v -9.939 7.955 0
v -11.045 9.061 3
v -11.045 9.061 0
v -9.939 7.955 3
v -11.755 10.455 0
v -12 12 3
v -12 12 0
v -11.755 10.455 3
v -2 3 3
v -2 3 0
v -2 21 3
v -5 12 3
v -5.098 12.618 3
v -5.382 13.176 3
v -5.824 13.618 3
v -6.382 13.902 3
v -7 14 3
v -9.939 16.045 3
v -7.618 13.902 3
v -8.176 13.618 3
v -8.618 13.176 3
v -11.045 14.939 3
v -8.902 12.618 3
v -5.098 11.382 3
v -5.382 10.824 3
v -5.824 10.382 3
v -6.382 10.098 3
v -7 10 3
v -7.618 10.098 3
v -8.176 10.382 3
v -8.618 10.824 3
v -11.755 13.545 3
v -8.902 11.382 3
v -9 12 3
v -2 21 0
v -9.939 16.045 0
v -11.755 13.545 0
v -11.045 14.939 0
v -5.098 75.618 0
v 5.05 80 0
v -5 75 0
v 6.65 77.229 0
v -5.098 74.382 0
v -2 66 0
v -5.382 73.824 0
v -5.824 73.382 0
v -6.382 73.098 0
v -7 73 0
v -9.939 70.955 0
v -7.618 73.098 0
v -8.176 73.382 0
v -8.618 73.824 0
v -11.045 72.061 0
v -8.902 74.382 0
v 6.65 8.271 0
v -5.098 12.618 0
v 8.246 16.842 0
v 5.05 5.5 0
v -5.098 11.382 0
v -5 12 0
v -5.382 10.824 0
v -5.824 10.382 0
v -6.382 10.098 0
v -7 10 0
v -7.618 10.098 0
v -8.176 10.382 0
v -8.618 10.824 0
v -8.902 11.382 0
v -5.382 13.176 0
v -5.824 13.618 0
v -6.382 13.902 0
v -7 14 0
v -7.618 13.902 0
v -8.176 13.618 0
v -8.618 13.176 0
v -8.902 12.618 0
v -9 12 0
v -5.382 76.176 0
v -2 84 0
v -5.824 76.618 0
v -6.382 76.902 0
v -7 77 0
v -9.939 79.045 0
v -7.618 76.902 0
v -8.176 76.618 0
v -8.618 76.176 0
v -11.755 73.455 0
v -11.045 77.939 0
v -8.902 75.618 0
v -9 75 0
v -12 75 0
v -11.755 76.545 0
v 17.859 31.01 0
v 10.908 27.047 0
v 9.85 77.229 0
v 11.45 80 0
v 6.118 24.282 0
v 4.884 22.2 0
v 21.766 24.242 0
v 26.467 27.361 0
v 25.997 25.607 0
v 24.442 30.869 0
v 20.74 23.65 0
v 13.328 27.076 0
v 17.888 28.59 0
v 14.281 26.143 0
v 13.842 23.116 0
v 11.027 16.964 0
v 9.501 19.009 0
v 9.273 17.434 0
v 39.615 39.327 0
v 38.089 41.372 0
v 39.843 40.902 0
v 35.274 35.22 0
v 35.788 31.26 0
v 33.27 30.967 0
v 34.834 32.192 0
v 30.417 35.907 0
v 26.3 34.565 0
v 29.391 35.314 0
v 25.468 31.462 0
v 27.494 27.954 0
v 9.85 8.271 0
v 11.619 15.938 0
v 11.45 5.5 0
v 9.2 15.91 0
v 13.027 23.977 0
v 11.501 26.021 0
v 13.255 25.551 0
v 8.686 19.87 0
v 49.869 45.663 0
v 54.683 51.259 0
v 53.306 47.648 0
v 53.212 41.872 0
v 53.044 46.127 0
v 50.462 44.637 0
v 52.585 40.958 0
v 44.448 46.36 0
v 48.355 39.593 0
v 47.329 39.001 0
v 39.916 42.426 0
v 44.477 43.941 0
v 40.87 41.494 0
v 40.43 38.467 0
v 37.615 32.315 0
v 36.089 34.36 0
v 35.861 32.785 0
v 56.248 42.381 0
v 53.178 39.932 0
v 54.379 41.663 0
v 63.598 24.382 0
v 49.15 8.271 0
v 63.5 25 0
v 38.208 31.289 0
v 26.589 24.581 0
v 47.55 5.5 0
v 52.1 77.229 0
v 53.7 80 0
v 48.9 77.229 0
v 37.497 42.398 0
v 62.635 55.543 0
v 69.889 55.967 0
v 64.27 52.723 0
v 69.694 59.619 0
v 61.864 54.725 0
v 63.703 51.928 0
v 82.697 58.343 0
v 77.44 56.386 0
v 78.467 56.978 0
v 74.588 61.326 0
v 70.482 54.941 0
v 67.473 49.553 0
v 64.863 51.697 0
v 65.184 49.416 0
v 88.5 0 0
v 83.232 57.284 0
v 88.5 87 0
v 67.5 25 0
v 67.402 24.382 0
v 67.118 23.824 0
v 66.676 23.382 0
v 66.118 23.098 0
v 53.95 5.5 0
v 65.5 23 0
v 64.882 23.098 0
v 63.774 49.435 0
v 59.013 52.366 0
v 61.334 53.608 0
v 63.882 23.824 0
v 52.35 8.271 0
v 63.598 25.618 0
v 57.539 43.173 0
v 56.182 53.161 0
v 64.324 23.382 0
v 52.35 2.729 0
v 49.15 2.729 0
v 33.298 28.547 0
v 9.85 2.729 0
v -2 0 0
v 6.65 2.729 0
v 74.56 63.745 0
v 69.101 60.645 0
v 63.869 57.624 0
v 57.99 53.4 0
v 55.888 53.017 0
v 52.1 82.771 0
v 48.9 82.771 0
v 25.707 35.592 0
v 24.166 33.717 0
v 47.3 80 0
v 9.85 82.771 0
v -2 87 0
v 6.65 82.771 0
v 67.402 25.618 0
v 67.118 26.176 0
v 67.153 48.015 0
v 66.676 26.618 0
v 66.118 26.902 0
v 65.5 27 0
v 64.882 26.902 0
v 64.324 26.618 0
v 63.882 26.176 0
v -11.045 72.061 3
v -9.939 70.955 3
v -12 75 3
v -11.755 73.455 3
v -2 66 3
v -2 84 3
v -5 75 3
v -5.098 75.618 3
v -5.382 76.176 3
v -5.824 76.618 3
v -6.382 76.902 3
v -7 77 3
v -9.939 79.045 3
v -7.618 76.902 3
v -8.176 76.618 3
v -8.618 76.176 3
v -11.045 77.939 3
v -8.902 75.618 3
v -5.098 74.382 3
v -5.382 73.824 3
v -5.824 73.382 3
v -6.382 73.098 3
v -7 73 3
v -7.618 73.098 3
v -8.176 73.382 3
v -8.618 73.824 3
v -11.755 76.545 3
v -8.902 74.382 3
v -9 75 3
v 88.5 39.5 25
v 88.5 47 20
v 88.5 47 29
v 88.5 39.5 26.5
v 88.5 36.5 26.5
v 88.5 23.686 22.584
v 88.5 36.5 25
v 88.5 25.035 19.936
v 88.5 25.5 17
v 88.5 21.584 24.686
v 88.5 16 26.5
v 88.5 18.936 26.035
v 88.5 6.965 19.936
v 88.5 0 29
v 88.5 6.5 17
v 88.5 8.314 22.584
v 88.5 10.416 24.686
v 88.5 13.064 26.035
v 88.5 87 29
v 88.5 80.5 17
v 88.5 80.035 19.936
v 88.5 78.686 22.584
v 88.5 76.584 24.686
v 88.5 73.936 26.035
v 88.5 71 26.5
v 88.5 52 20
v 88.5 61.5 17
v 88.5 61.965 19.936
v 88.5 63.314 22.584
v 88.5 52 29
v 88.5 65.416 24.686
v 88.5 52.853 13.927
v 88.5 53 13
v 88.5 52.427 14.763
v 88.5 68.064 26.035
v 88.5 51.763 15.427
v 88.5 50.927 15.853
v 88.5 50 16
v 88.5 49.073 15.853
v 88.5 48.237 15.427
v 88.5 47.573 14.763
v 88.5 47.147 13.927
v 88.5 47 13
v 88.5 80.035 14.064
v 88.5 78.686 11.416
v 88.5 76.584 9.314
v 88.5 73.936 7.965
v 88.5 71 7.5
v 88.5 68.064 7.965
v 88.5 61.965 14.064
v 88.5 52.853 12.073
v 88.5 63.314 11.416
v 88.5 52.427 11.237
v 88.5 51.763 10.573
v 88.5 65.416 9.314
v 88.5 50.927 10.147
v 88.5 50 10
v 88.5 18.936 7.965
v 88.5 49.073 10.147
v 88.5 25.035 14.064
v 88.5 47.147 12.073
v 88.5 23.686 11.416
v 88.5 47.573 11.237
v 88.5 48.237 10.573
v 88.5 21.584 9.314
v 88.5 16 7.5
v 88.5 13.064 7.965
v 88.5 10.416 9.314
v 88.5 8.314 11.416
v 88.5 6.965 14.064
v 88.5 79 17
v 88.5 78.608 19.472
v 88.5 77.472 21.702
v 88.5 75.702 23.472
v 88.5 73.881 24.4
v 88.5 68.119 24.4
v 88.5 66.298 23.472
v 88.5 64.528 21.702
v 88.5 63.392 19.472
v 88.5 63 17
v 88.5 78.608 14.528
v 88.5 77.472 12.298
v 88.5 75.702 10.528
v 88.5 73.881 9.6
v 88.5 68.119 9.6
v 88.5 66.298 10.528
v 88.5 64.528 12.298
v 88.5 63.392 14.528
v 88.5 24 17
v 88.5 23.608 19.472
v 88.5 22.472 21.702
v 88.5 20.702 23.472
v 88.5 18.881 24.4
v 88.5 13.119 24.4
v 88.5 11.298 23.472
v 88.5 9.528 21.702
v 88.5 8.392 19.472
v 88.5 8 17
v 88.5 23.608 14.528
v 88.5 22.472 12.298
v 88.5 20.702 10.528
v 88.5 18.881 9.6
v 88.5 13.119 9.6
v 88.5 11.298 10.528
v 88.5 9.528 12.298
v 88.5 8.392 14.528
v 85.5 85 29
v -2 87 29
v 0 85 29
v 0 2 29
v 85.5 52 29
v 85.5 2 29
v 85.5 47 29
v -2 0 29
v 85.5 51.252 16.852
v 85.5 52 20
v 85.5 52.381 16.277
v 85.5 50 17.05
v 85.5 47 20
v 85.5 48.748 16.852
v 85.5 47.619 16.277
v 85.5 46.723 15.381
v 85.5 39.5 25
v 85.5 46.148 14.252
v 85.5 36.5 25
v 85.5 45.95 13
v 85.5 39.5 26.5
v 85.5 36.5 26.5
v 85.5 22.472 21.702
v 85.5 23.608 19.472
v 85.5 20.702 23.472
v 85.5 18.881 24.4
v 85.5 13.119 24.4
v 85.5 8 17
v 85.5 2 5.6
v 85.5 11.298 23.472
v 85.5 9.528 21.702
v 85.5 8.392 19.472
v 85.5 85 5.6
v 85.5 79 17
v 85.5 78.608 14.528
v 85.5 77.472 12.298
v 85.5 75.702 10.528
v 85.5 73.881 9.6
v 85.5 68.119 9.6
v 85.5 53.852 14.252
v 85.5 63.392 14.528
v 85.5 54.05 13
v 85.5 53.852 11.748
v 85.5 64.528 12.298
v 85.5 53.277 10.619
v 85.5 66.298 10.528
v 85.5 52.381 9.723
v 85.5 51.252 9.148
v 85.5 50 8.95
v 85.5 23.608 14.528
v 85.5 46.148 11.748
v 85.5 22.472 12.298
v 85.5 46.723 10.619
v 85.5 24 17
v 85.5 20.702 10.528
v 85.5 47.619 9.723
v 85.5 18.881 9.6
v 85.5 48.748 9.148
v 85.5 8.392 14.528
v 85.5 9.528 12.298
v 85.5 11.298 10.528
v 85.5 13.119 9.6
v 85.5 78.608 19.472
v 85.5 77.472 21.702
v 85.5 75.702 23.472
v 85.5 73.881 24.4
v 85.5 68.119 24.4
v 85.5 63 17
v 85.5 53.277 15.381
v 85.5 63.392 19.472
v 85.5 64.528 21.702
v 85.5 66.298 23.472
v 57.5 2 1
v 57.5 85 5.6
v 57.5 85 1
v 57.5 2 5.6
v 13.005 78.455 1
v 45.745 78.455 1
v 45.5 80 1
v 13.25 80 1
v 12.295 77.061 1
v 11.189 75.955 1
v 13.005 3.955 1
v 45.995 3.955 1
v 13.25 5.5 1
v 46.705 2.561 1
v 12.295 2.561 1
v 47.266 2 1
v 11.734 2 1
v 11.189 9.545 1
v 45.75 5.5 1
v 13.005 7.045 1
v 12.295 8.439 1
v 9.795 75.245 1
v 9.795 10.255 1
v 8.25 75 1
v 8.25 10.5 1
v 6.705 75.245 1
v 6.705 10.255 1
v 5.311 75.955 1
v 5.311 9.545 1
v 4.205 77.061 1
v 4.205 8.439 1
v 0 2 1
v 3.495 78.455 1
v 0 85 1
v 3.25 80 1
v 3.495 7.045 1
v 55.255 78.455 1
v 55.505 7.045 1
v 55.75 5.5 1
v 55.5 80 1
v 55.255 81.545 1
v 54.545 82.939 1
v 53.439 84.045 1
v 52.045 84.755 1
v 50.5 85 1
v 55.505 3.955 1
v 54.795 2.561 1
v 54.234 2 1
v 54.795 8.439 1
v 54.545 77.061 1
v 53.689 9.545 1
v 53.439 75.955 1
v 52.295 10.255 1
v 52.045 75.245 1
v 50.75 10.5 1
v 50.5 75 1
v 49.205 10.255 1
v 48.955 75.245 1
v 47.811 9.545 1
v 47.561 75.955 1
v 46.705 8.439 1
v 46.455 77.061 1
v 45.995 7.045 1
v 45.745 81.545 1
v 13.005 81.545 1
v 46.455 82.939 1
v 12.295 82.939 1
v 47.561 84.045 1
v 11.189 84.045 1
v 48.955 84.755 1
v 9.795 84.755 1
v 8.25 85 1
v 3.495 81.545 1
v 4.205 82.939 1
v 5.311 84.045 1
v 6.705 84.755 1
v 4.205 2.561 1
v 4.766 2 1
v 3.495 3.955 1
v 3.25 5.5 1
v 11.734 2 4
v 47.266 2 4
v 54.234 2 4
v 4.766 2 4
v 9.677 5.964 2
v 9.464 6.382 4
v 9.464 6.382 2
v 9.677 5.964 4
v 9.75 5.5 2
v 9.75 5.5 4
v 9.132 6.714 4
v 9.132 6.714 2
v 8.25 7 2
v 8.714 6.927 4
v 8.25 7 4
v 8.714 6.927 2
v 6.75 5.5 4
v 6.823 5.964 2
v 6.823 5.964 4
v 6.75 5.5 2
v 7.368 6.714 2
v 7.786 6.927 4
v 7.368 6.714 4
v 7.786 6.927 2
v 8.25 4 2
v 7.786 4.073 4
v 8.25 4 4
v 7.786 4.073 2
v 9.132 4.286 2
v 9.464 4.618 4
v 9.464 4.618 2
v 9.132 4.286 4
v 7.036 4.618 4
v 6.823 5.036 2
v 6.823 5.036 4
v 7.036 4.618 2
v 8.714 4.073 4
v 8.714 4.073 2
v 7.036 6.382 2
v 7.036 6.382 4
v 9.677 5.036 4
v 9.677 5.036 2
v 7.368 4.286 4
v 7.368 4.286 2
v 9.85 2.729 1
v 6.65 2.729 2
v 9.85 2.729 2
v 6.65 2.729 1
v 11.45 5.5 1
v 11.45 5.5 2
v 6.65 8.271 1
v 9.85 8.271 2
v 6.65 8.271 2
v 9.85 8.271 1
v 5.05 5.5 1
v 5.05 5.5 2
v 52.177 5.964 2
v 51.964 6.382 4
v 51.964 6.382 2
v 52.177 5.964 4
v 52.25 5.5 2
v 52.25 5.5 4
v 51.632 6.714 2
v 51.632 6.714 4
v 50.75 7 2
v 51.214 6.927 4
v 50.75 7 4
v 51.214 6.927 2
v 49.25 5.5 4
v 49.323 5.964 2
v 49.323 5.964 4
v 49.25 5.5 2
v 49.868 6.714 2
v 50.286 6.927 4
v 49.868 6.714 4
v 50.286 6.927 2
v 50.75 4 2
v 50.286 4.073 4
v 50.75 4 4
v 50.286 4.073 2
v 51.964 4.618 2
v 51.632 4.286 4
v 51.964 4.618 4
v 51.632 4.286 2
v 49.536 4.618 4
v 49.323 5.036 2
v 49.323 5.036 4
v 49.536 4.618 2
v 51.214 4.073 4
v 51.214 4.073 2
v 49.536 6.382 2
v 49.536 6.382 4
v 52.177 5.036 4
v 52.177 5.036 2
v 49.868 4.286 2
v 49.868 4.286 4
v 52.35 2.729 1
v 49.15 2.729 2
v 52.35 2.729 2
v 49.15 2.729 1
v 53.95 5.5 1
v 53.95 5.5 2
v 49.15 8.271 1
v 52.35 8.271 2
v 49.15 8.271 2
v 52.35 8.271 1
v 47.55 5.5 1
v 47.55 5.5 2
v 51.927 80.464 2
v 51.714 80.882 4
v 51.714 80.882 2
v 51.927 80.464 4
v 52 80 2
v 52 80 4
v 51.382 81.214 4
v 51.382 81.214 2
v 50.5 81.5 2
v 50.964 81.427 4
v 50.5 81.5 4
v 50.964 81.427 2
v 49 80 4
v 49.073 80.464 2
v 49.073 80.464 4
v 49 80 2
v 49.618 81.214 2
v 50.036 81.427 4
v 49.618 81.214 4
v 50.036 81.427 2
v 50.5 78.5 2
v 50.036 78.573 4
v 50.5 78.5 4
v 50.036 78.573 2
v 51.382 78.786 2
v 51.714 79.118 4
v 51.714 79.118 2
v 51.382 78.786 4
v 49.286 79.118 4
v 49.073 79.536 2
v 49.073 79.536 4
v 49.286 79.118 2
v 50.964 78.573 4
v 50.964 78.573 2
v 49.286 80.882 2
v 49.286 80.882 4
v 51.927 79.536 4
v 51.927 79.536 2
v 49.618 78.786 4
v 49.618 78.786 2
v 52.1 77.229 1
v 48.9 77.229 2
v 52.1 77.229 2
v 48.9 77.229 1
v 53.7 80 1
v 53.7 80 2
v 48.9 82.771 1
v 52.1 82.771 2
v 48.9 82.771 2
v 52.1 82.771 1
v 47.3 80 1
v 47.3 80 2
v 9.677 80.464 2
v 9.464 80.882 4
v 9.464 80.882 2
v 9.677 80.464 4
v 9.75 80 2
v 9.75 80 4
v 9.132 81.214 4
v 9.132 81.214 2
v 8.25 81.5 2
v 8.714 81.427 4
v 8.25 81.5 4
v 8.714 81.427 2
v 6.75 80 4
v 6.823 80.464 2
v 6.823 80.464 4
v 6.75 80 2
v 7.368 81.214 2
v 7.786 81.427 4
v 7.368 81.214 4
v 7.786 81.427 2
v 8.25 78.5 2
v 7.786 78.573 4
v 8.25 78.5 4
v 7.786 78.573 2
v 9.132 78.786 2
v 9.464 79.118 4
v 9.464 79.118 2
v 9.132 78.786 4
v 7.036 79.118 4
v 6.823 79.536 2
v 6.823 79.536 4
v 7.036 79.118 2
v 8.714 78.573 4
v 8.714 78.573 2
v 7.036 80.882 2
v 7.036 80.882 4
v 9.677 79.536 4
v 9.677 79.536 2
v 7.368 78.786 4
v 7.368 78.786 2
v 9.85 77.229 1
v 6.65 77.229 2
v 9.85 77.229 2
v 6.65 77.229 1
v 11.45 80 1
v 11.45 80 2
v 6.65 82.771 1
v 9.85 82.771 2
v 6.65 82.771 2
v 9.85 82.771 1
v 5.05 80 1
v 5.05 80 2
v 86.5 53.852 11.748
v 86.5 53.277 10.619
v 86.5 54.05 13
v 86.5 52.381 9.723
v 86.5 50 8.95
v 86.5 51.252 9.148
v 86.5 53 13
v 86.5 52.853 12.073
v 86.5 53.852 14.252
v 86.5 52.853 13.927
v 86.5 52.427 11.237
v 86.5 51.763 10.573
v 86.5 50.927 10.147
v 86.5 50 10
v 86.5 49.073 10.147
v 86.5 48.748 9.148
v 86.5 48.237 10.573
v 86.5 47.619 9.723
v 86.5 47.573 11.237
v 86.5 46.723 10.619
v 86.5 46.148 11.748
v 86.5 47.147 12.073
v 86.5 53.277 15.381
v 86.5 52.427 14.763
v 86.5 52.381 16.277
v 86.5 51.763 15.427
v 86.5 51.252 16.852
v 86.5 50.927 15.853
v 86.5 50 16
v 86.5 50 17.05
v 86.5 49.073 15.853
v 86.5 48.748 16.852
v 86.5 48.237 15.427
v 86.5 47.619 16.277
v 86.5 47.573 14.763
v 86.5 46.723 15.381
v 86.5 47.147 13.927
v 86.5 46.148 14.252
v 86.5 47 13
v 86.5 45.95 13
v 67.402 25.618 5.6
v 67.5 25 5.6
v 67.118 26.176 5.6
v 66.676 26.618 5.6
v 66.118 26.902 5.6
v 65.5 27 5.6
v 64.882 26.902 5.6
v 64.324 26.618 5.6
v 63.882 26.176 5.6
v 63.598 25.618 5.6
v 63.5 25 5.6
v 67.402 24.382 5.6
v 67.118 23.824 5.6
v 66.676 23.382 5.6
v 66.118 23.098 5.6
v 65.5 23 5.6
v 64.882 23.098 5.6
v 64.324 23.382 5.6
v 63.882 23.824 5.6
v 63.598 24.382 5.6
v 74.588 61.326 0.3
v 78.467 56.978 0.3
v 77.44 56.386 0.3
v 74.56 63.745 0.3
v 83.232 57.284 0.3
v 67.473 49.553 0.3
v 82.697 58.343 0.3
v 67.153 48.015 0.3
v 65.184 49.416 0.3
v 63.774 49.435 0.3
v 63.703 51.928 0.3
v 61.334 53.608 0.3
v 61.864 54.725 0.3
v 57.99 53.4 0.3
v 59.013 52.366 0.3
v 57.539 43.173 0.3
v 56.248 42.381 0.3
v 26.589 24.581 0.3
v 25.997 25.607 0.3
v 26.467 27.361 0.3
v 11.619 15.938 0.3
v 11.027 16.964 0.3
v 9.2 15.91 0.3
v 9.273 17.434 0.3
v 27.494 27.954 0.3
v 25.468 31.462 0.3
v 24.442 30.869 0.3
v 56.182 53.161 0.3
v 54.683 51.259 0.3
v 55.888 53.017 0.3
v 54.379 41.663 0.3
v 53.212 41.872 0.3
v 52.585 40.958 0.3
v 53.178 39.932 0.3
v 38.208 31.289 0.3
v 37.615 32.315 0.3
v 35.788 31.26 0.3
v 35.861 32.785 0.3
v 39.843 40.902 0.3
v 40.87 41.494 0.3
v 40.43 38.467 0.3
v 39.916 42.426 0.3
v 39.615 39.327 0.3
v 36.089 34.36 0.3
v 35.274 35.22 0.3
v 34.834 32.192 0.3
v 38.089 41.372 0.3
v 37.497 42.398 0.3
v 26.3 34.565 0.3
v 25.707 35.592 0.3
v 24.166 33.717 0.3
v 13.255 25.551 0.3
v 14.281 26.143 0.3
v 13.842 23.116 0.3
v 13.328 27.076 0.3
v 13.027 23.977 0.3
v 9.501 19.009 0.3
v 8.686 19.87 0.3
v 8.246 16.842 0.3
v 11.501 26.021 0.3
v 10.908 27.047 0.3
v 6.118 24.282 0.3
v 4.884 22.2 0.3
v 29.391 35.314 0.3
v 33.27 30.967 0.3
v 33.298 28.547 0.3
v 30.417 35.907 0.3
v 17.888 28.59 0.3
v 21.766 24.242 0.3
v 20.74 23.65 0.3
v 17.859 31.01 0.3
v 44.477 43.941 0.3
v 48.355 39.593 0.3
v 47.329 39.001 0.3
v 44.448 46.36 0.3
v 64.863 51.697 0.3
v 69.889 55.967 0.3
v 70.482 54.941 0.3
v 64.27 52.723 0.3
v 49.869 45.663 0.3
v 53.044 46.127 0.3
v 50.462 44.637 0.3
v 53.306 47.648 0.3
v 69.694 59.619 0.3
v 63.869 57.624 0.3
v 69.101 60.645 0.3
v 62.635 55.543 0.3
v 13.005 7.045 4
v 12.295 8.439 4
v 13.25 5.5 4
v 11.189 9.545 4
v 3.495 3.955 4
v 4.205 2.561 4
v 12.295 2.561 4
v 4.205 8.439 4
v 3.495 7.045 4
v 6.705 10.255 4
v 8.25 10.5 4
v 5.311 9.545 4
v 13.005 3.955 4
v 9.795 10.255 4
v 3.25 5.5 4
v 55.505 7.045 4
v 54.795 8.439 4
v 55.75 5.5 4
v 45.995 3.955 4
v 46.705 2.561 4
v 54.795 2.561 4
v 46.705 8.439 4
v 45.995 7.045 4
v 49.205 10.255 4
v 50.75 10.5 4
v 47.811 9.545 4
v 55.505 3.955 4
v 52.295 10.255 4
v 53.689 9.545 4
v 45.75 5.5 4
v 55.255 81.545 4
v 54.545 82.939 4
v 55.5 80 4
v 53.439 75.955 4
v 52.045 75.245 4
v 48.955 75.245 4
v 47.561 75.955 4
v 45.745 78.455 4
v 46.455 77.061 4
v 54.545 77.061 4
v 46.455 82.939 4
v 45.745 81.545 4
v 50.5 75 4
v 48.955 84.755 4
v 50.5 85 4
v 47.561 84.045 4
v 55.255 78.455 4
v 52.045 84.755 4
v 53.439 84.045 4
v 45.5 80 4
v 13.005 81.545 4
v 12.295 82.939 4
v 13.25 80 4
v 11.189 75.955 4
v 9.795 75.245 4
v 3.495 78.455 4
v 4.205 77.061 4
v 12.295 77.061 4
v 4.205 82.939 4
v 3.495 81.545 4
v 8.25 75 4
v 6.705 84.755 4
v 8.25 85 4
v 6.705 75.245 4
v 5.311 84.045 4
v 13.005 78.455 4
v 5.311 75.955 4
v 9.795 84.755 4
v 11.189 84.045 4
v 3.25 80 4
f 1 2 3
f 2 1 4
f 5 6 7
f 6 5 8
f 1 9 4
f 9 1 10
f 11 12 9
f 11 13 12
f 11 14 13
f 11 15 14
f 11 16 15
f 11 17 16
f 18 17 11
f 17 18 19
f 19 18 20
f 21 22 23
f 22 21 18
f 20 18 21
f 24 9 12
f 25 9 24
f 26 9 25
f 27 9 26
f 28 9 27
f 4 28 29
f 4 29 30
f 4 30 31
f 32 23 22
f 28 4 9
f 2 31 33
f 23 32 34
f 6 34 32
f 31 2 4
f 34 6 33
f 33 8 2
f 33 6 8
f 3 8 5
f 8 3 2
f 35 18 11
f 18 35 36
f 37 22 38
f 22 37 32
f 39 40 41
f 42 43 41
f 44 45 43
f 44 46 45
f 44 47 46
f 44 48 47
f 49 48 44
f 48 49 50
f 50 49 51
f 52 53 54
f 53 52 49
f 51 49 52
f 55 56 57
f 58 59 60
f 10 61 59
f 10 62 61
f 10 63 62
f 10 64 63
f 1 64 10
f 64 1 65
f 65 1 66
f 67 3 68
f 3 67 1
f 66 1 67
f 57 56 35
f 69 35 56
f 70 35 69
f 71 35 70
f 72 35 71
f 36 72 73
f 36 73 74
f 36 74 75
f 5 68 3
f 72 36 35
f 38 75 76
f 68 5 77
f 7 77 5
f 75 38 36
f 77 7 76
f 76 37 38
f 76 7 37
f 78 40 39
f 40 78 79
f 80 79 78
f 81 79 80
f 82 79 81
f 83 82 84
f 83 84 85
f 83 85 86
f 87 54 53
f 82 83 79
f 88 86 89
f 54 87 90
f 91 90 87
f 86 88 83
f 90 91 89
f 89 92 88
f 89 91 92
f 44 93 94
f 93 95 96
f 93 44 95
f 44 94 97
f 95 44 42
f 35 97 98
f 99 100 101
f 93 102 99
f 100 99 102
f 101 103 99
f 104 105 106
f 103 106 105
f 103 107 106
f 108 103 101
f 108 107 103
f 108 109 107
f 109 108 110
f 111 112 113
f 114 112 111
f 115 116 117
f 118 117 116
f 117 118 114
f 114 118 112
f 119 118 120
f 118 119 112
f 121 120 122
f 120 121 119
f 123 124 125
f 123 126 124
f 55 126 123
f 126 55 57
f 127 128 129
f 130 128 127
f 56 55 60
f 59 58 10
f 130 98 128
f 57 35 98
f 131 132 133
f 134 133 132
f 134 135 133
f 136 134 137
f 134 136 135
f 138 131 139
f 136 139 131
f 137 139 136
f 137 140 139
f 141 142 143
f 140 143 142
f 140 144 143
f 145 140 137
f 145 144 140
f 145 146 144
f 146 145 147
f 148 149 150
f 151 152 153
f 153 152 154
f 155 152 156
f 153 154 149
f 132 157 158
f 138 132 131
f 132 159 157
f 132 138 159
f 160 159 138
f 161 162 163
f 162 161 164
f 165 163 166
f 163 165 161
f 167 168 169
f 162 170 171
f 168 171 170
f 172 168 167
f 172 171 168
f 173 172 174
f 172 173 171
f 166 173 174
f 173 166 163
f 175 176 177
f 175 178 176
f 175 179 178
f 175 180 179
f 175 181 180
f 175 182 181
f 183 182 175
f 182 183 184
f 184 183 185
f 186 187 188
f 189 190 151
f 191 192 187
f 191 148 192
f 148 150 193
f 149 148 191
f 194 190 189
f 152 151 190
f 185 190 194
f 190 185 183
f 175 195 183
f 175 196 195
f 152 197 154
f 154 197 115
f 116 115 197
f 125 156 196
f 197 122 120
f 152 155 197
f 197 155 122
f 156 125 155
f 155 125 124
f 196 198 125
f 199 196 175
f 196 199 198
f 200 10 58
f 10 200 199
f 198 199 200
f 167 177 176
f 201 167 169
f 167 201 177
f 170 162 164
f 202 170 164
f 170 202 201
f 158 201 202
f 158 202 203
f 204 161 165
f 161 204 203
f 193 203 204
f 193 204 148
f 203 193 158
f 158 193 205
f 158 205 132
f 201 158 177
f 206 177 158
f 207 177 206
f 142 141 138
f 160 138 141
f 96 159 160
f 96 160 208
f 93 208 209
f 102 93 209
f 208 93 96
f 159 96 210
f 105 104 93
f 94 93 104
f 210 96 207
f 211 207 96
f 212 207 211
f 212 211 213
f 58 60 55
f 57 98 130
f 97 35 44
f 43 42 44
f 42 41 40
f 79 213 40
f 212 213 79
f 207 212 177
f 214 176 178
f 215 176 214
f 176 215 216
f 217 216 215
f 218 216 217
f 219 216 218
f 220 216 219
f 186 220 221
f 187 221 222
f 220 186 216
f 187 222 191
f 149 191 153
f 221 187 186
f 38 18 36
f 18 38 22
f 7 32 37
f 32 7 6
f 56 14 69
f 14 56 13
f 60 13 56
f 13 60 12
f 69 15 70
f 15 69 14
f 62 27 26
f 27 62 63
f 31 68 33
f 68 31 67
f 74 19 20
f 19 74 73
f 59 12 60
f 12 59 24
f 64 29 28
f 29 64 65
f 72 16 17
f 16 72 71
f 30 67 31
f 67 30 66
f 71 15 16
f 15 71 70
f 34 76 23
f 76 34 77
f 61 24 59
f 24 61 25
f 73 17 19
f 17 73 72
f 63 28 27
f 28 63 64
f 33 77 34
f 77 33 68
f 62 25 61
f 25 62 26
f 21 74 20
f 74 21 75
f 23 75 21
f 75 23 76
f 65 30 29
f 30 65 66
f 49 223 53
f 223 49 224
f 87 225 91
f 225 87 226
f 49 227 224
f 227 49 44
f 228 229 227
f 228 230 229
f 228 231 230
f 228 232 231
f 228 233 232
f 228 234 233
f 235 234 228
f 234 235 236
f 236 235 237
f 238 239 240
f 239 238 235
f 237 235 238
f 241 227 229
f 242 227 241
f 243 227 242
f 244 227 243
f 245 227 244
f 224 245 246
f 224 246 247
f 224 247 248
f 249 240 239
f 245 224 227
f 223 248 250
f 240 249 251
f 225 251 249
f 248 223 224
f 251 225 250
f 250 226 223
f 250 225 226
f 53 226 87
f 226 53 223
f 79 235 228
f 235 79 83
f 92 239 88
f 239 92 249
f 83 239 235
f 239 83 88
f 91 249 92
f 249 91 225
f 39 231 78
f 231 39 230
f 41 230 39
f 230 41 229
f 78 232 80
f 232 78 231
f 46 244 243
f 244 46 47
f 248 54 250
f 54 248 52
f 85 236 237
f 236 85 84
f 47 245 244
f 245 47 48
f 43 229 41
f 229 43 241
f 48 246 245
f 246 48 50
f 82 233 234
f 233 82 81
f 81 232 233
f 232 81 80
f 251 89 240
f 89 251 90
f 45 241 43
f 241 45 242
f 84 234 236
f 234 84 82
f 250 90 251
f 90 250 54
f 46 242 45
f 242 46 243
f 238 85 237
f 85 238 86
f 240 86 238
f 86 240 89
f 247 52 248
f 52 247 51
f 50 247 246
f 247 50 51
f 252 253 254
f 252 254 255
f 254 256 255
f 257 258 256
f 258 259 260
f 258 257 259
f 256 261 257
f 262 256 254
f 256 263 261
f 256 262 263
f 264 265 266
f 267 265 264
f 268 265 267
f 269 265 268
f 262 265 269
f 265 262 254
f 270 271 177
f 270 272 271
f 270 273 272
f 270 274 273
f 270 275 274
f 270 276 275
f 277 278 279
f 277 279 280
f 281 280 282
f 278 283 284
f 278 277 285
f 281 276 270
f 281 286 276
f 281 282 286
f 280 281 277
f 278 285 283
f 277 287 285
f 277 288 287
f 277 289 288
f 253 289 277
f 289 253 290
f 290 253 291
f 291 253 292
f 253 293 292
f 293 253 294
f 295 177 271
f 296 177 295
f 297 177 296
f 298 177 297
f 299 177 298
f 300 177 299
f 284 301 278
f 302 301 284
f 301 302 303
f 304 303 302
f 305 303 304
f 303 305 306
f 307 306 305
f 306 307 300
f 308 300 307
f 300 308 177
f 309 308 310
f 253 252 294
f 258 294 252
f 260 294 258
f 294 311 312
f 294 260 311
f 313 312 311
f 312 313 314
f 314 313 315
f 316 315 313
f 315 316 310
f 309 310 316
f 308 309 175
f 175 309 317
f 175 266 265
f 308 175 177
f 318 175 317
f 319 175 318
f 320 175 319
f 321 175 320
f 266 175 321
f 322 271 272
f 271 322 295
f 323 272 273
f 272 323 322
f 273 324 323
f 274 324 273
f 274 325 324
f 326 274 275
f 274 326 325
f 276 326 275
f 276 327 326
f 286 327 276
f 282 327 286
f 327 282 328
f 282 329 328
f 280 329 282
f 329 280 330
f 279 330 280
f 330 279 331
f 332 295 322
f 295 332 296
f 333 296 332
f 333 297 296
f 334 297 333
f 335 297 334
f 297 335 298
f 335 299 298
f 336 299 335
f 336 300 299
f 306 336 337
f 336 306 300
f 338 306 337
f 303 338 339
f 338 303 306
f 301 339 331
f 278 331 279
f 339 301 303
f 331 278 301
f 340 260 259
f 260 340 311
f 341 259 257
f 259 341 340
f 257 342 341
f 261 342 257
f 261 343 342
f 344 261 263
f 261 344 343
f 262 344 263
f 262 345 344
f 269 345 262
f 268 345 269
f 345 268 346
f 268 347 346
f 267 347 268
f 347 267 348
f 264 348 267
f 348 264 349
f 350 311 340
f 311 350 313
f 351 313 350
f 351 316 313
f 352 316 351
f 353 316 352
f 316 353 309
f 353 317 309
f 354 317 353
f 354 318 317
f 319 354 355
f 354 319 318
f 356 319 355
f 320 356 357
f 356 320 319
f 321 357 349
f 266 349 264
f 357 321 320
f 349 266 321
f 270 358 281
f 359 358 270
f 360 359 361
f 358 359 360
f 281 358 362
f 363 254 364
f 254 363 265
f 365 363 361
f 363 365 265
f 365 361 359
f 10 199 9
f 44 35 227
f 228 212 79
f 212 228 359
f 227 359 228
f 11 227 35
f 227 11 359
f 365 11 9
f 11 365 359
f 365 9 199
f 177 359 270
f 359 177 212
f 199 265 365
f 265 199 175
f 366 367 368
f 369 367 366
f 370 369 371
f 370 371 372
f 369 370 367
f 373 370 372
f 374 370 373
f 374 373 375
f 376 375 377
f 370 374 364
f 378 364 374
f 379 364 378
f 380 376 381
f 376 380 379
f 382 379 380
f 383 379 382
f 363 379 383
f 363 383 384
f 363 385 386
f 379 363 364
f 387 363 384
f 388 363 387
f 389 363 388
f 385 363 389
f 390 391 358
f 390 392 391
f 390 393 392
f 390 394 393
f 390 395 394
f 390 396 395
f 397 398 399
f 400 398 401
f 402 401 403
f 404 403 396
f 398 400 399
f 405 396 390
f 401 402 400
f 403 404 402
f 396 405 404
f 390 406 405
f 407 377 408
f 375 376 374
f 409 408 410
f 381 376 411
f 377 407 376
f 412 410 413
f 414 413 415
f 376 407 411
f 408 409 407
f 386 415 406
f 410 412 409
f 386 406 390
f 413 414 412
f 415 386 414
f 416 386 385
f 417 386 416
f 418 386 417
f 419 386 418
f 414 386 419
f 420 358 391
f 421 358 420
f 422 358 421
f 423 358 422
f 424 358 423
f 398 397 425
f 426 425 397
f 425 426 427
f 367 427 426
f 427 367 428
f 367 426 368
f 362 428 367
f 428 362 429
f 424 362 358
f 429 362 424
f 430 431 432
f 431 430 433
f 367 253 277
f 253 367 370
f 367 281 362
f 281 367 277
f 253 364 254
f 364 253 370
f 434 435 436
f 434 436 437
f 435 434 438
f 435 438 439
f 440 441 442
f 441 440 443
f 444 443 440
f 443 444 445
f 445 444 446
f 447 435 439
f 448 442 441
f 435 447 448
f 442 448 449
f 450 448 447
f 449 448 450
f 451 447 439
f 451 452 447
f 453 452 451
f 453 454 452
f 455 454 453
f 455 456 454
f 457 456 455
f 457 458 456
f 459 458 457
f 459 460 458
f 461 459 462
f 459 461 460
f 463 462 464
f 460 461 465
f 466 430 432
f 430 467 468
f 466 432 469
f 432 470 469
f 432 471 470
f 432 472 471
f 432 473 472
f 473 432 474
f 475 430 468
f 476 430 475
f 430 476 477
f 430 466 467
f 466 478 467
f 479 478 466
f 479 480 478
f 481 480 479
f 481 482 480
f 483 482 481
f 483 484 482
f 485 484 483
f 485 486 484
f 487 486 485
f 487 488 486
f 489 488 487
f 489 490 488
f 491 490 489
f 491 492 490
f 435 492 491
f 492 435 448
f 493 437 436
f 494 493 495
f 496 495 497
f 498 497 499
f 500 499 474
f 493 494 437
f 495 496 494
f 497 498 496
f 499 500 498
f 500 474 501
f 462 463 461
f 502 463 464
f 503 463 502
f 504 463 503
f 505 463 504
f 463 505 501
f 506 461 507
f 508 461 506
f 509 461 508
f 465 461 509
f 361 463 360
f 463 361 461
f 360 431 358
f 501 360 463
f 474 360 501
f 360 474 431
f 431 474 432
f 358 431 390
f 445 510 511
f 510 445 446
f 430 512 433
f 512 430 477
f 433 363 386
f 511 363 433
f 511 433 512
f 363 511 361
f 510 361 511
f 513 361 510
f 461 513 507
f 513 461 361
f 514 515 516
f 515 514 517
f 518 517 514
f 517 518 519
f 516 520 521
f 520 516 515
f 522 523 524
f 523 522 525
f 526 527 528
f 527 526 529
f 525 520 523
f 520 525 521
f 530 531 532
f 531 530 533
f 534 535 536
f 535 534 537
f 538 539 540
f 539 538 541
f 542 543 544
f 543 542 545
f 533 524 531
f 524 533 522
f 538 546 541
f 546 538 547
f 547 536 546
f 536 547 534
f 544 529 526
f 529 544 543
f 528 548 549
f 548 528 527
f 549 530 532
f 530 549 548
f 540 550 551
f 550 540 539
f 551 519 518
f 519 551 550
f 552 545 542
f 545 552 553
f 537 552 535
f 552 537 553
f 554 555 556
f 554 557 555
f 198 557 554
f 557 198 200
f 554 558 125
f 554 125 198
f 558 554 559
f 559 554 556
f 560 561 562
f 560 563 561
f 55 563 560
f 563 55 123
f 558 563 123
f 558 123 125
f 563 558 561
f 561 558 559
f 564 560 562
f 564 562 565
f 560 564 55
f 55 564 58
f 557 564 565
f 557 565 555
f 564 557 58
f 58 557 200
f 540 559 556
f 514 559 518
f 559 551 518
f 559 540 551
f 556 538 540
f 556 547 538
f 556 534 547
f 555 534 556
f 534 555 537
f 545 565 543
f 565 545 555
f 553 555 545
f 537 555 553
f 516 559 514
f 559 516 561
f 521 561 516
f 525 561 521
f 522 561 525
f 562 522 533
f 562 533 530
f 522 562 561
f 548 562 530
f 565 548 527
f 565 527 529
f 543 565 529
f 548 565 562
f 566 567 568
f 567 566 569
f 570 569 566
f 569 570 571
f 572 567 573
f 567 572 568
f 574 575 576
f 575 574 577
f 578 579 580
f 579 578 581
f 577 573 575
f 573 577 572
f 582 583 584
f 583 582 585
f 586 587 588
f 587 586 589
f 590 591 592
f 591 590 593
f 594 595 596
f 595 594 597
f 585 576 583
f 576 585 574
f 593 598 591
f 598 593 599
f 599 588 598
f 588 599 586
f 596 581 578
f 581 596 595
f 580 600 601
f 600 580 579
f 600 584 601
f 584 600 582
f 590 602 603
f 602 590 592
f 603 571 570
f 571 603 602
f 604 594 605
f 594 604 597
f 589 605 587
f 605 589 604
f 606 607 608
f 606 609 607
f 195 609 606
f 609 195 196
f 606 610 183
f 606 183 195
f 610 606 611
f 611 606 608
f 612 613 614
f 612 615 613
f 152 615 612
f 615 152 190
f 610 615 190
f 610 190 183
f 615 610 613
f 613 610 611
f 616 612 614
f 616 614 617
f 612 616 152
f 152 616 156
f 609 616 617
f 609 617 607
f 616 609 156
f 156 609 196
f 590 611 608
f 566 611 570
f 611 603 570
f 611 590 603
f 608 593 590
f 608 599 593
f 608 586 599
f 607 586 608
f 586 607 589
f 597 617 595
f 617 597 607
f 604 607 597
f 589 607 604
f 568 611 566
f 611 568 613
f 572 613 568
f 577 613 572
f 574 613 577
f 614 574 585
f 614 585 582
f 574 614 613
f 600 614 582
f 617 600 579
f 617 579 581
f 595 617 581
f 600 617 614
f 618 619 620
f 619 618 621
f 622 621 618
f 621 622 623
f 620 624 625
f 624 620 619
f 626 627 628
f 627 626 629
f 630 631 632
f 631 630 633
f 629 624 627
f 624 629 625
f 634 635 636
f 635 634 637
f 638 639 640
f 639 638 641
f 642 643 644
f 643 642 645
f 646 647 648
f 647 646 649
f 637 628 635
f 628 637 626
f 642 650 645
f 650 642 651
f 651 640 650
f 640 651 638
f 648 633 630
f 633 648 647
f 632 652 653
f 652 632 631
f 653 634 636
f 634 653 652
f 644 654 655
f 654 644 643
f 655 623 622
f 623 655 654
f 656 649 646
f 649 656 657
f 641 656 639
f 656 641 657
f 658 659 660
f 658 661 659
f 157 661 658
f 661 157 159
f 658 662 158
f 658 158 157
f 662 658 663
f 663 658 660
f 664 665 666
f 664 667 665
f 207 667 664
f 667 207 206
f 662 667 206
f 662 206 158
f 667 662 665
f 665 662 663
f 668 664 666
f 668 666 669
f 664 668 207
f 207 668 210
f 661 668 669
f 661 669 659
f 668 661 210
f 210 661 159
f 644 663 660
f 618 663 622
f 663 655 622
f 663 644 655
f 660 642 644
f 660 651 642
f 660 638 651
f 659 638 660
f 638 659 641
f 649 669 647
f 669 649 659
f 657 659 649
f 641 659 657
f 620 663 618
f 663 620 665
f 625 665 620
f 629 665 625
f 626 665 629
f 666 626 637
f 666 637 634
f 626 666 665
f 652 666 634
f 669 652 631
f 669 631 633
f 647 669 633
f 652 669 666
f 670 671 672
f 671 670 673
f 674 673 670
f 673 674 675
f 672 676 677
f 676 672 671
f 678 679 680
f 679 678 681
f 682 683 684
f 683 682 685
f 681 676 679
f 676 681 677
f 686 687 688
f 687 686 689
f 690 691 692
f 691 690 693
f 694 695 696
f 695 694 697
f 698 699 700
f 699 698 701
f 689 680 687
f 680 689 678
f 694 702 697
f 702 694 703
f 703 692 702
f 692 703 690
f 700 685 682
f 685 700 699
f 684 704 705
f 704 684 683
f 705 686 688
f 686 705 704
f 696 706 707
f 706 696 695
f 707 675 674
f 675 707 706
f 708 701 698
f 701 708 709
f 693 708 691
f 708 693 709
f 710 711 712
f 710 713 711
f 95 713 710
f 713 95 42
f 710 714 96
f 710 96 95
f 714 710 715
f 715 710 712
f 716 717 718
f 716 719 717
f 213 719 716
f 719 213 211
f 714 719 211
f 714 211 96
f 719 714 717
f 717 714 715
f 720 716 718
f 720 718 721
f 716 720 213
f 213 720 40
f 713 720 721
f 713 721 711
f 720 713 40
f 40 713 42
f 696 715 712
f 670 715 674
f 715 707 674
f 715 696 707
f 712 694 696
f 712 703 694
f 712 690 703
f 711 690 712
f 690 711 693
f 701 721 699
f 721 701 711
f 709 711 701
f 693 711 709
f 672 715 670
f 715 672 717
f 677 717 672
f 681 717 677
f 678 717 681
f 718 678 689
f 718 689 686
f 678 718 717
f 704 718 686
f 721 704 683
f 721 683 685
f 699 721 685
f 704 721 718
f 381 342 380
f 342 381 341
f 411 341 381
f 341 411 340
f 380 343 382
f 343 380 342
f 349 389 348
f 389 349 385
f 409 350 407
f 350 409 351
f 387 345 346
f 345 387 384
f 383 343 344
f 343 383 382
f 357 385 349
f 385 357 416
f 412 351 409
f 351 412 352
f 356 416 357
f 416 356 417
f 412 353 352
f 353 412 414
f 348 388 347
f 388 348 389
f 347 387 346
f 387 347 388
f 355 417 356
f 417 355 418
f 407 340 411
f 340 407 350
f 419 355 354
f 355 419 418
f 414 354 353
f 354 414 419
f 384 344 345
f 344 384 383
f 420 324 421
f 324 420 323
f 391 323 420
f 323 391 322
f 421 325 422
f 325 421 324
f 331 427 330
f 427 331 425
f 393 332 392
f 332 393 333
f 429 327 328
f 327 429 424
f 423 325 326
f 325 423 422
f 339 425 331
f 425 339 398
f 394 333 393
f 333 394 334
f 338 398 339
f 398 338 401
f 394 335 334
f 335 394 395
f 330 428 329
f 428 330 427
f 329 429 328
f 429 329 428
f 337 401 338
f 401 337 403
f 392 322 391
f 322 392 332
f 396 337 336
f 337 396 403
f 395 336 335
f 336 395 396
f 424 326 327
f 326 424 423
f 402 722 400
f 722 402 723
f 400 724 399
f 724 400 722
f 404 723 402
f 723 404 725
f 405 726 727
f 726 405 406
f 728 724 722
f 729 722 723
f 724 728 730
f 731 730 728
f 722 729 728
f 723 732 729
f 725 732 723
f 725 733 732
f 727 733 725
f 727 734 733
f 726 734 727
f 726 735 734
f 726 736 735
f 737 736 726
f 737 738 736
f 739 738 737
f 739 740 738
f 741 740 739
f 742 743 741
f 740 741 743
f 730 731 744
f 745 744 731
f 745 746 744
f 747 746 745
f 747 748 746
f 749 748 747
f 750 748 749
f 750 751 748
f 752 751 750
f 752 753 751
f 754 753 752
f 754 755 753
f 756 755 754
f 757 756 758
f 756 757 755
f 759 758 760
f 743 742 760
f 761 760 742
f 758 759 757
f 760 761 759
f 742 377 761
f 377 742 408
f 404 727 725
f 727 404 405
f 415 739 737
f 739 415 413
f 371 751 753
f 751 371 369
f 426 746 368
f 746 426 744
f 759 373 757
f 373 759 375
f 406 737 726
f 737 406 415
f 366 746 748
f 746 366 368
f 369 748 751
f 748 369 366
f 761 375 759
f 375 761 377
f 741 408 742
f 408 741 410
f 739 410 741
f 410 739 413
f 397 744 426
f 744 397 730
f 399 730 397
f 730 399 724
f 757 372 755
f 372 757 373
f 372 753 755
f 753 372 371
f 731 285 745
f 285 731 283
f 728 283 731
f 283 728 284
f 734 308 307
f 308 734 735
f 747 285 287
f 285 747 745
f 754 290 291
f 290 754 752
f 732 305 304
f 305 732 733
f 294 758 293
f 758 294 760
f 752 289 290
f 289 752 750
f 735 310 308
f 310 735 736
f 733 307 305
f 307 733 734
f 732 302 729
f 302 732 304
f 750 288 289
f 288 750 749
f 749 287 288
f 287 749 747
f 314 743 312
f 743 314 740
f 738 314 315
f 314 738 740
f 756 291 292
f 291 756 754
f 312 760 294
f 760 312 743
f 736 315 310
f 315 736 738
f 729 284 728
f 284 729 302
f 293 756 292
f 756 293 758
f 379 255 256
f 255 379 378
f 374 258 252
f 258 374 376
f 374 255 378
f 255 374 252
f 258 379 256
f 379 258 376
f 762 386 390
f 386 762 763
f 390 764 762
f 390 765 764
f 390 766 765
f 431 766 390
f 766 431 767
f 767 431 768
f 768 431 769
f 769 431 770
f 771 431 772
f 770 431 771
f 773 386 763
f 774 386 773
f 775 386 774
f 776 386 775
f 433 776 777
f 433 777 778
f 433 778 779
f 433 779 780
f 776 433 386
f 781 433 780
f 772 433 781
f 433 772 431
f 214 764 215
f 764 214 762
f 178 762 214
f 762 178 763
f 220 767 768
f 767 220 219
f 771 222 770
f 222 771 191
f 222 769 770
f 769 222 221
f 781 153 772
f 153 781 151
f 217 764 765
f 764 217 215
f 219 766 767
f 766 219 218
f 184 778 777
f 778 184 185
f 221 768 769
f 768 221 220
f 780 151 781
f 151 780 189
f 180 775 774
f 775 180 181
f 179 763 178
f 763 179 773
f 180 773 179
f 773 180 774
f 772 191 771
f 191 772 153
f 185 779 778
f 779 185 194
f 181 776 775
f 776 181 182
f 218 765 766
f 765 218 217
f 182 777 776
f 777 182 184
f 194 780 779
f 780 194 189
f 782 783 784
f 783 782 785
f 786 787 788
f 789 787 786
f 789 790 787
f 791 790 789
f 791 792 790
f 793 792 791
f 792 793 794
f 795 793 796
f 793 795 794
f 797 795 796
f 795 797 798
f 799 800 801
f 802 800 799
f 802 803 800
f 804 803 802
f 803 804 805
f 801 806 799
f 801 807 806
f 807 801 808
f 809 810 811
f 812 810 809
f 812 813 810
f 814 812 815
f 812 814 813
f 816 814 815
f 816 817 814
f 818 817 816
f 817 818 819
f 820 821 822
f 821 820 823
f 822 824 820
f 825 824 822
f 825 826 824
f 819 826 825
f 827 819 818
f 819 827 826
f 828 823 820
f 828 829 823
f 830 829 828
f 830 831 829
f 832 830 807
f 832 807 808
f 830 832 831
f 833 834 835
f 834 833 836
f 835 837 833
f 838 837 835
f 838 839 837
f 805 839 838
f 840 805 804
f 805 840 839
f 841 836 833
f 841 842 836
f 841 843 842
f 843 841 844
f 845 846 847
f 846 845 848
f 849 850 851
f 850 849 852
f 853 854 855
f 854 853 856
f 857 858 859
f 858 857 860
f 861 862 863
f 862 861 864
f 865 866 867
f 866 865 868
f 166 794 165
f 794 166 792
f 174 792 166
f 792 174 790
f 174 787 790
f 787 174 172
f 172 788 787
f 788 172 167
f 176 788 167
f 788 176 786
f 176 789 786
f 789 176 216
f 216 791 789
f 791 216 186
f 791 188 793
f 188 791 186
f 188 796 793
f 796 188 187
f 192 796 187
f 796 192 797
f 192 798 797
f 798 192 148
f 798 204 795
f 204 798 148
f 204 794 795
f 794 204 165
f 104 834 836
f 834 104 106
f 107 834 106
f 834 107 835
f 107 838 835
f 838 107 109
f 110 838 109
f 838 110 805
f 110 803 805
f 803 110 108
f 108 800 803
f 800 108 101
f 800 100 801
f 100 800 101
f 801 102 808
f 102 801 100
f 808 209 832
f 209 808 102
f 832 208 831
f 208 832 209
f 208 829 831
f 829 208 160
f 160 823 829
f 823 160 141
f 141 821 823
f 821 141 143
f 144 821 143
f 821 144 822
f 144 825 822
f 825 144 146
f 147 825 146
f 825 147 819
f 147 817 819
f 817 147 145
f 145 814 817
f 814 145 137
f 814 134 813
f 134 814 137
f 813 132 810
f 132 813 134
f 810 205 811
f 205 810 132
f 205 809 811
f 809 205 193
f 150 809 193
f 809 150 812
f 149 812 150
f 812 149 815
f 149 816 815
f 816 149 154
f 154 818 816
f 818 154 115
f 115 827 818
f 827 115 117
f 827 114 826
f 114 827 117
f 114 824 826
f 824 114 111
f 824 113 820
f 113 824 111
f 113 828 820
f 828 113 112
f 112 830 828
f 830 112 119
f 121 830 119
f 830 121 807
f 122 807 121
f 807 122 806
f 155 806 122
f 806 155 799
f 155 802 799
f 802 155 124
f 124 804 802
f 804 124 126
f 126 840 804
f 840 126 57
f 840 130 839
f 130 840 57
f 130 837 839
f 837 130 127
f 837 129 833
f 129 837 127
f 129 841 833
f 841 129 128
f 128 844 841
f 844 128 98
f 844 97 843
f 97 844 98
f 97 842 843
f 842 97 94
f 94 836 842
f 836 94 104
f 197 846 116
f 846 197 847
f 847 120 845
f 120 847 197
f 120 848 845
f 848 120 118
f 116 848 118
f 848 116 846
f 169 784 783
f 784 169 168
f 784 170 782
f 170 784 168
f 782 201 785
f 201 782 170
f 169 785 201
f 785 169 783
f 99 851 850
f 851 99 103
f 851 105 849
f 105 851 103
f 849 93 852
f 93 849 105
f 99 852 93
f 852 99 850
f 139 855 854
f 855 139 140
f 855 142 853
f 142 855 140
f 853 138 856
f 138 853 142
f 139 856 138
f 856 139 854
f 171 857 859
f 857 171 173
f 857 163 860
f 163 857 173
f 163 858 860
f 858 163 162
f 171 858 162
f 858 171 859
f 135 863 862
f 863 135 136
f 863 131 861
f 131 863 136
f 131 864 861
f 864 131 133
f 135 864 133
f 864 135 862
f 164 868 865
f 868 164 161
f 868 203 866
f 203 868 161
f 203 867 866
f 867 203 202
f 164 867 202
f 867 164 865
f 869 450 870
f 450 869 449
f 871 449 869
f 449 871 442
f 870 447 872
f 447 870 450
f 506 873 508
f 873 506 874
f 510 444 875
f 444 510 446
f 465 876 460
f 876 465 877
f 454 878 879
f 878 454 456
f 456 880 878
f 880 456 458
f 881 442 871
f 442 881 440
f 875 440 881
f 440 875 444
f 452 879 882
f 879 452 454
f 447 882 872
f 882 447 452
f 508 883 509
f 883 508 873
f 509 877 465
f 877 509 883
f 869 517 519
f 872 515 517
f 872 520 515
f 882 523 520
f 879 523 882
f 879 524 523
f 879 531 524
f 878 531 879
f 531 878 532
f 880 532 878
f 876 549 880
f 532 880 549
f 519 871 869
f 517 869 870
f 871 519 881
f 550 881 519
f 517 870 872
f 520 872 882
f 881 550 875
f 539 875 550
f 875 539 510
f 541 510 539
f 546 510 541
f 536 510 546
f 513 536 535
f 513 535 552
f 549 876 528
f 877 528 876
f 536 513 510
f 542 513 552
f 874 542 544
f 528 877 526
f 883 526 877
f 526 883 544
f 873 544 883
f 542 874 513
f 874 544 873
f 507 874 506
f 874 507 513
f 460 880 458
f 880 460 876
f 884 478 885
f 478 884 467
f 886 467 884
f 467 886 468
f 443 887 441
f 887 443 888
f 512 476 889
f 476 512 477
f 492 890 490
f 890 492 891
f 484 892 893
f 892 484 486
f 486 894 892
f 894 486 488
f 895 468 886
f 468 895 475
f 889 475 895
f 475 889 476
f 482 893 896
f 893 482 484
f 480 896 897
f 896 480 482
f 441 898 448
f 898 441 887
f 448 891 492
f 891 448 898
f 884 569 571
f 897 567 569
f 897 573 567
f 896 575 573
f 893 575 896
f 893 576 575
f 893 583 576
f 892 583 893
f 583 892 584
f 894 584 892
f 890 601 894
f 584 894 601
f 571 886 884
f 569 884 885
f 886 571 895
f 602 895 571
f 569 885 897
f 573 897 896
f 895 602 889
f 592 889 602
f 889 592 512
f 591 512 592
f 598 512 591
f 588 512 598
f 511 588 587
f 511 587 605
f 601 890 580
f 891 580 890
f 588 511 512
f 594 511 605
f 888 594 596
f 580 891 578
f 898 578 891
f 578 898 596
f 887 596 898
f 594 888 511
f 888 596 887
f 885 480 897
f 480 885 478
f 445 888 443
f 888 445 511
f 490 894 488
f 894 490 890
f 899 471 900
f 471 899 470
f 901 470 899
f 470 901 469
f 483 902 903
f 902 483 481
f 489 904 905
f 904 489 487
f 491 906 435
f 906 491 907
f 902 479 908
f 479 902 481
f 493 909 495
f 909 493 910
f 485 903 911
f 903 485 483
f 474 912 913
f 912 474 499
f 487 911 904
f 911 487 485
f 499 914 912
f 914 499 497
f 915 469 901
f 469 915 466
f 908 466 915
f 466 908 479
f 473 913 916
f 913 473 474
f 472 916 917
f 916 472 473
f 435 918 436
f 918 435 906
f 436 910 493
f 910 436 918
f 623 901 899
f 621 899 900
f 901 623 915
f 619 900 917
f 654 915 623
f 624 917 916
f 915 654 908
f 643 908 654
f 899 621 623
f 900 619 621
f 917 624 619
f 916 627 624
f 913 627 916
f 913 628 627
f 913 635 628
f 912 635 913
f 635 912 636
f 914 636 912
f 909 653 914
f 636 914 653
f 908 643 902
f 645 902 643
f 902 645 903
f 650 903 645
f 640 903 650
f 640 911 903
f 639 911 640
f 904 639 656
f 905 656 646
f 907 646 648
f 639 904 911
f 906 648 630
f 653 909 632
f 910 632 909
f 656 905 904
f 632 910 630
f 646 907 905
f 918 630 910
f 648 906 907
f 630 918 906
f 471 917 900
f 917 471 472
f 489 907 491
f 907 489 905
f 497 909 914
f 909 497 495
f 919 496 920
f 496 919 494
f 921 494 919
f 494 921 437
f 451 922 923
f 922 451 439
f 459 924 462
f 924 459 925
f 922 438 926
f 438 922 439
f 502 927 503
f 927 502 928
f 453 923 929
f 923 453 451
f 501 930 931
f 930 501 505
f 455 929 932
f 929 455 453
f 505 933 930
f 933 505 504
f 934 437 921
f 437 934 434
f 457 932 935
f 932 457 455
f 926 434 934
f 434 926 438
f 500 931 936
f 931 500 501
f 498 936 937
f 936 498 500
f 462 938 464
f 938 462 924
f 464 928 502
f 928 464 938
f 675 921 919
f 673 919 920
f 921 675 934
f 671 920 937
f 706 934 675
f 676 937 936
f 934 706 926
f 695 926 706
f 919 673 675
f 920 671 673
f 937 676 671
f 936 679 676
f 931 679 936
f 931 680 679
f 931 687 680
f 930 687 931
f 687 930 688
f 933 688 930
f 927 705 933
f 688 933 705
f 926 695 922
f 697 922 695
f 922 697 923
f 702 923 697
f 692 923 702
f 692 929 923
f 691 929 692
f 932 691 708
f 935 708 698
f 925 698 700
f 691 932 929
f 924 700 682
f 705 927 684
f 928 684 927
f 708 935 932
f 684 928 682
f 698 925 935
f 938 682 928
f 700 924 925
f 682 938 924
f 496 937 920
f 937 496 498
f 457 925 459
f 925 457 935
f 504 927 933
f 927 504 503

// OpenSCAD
$fn = 20;

standheight = 3;

// Measurements of the pcb (including mounts)
pcbsize = [57.5, 83, 25 + standheight];

// frontyard size
frontyard_height = 1.6 + standheight;
frontyard = [28, pcbsize[1], pcbsize[2] - frontyard_height];

hole_positions = [[8.25, 3.5],
                  [50.75, 3.5],
                  [50.5, 78],
                  [8.25, 78] 
];

// Wall thickness of the inner part
bottom_backwall = 1;
bottom_outerwall = 2;
bottom_frontwall = 3;

top_outerwall = 3;

wall_hole_positions = [
    [ pcbsize[0] + 8, 25, 0 ],
   [ -7, 10 + bottom_outerwall, 0],
   [ -7, -10 + pcbsize[1] + bottom_outerwall, 0]];

module stustanet_logo(height) {
    linear_extrude(height = height, convexity=100)
        import (file = "logo.dxf");
    
}

module pcb(bottom_height) {
    cube(pcbsize);
    
    // the antenna
    translate([pcbsize[0], 35.5, 6 + standheight])
    rotate([0, 90, 0])
    cylinder(h=27, d=6);
    
    // the usb plug
    translate([pcbsize[0], 44, 14 + standheight]) {
        cube([28, 12, 6]);
        // the cable
        
        translate([23, 1, 2])
        cube([15, 5, 3 + bottom_height * 1000]);
    }
}

// The origin of the sensor is the inside of the mount, -x is the direction of the connector
module sensorplug() {
    rotate([0,0,90]) {
        // The inner with the flat areas
        difference() {
            translate([0, 9, 0])
            rotate([90, 0, 0])
            cylinder(r=8, h=16.5);
            
            translate([0, 0, -8])
            cube([10, 20, 1.2], center=true);
            translate([0, 0, 8])
            cube([10, 20, 1.2], center=true);
        }
        // The Ring
        translate([])
        rotate([90, 0, 0])
        cylinder(d=19, h=2);
        
        // the plug connectors
        translate([0, 19, 0])
        rotate([90, 0, 0])
        cylinder(d=10, h=10);
    }
}

// here also -y is the direction where the plug comes in
// Beware - the audio plug needs min. 2mm of the frontal mount = the wall at the audio plug must be max. 2mm!
module audioplug() {
    rotate([0, 0, 90]) {
        // Base
        rotate([-90, 0, 0])
        cylinder(h=20, d=8.1);

        // Screwing part
        translate([])
        rotate([90, 0, 0])
        cylinder(h=4.5, d=6);
    }
}

module make_pcb_pin(pos) {
    translate(pos)
    translate([0, bottom_outerwall, bottom_backwall])
    cylinder(r=5, h=standheight);
}

module make_pcb_pin_hole(pos) {
    translate(pos)
    translate([0, bottom_outerwall, 0]) {
        // M3 screw
        cylinder(d=3, h=10);
        // M3 screwhead
        cylinder(d=6.4, h = 2, $fn=6);
    }
}

module wall_mount_hole(pos) {
    translate(pos) {
        cylinder(h=bottom_backwall + 100, d = 4);
    }
}

module wall_mount(pos) {
    height = 3;
    difference() {
        translate(pos) {
            hull() {
                cylinder(h=height, d = 10);
                translate([15, 0, height/2])
                cube([20, 18, height], center=true);
            }
        }
        wall_mount_hole(pos);
    }
}


module bottom() {
    difference() {
        union () {
            translate([-bottom_outerwall, 0, 0])
            cube([pcbsize[0] + frontyard[0] + bottom_frontwall + bottom_outerwall, 
                pcbsize[1] + bottom_outerwall * 2,
                pcbsize[2] + bottom_backwall
            ]);
            wall_mount(wall_hole_positions[1]);
            wall_mount(wall_hole_positions[2]);
        }
        
        // Frontyard
        translate([pcbsize[0],
            bottom_outerwall,
            bottom_backwall + frontyard_height])
        cube(frontyard);
        
        translate([0, bottom_outerwall, bottom_backwall])
        pcb(1);

        for (i = hole_positions) {
            make_pcb_pin_hole(i);
        }
        
        wall_mount_hole(wall_hole_positions[0]);

        translate([pcbsize[0] + frontyard[0] + bottom_frontwall, 0, 0]) {
            translate([0, 14 + bottom_outerwall, 17])
            sensorplug();
            
            translate([0, pcbsize[1] - 14 + bottom_outerwall, 17])
            sensorplug();
            
            translate([-2, pcbsize[1]/2 + 8.5, 13])
            audioplug();
        
            cablebinder_width = 3;
            cablebinder_height = 1.5;
            // Cablebinder holder hole
            translate([-5, pcbsize[1]/2 - 5, 25])
            cube([10, cablebinder_width, cablebinder_height]);
        }

        
        ssnscale = 0.35;
        translate([0, 25, 0.3])
        rotate([180, 0, 30])
        scale([ssnscale, ssnscale, 1])
        stustanet_logo(0.3);
        
    }
    for (i = hole_positions) {
        difference() {
            make_pcb_pin(i);
            make_pcb_pin_hole(i);
        }
    }
}

module top() {
    hook_size = 3;
    
    difference() {
        translate([-top_outerwall - bottom_outerwall, -top_outerwall, -top_outerwall - 0.2])
        cube([pcbsize[0] + frontyard[0] + bottom_frontwall + bottom_outerwall + top_outerwall * 1, 
            pcbsize[1] + bottom_outerwall * 2 + top_outerwall * 2,
            pcbsize[2] + bottom_backwall + top_outerwall * 2 + 0.2
        ]);


        translate([hook_size, hook_size, -5])
        cube([pcbsize[0] + frontyard[0] + bottom_frontwall + bottom_outerwall + top_outerwall * 1 - hook_size * 2, 
            pcbsize[1] + bottom_outerwall * 2 - hook_size * 2,
            10
        ]);

        ssnscale = 0.15;
        translate([85, 7, pcbsize[2] + bottom_backwall + top_outerwall - 0.3])
        rotate([0, 0, 180])
        scale([ssnscale, ssnscale, 1])
        stustanet_logo(0.3);
        
        translate([-bottom_outerwall, 0, 0])
        cube([pcbsize[0] + frontyard[0] + bottom_frontwall + bottom_outerwall, 
            pcbsize[1] + bottom_outerwall * 2,
            pcbsize[2] + bottom_backwall
        ]);
        scale([1,1,3])
        translate([0,0,-1.5])
        wall_mount(wall_hole_positions[1]);

        scale([1,1,3])
        translate([0,0,-1.5])
        wall_mount(wall_hole_positions[2]);
    
        cablebinder_width = 3;
        cablebinder_height = 1.5;
        // Cablebinder holder hole
        translate([
            pcbsize[0] + frontyard[0] - 3,
            pcbsize[1]/2 - 5, 
            pcbsize[2]])
        cube([cablebinder_height, cablebinder_width, 10]);

    
    }
    
    translate([0, bottom_outerwall, bottom_backwall] + [pcbsize[0], 44, 14 + standheight] + [23, 1, 2] + [6, 0, 3])
    cube([bottom_outerwall, 5, 3 + 3]);
}

//translate([0, bottom_outerwall, bottom_backwall])
//#pcb();
//sensorplug();
//audioplug();

//top();
bottom();
